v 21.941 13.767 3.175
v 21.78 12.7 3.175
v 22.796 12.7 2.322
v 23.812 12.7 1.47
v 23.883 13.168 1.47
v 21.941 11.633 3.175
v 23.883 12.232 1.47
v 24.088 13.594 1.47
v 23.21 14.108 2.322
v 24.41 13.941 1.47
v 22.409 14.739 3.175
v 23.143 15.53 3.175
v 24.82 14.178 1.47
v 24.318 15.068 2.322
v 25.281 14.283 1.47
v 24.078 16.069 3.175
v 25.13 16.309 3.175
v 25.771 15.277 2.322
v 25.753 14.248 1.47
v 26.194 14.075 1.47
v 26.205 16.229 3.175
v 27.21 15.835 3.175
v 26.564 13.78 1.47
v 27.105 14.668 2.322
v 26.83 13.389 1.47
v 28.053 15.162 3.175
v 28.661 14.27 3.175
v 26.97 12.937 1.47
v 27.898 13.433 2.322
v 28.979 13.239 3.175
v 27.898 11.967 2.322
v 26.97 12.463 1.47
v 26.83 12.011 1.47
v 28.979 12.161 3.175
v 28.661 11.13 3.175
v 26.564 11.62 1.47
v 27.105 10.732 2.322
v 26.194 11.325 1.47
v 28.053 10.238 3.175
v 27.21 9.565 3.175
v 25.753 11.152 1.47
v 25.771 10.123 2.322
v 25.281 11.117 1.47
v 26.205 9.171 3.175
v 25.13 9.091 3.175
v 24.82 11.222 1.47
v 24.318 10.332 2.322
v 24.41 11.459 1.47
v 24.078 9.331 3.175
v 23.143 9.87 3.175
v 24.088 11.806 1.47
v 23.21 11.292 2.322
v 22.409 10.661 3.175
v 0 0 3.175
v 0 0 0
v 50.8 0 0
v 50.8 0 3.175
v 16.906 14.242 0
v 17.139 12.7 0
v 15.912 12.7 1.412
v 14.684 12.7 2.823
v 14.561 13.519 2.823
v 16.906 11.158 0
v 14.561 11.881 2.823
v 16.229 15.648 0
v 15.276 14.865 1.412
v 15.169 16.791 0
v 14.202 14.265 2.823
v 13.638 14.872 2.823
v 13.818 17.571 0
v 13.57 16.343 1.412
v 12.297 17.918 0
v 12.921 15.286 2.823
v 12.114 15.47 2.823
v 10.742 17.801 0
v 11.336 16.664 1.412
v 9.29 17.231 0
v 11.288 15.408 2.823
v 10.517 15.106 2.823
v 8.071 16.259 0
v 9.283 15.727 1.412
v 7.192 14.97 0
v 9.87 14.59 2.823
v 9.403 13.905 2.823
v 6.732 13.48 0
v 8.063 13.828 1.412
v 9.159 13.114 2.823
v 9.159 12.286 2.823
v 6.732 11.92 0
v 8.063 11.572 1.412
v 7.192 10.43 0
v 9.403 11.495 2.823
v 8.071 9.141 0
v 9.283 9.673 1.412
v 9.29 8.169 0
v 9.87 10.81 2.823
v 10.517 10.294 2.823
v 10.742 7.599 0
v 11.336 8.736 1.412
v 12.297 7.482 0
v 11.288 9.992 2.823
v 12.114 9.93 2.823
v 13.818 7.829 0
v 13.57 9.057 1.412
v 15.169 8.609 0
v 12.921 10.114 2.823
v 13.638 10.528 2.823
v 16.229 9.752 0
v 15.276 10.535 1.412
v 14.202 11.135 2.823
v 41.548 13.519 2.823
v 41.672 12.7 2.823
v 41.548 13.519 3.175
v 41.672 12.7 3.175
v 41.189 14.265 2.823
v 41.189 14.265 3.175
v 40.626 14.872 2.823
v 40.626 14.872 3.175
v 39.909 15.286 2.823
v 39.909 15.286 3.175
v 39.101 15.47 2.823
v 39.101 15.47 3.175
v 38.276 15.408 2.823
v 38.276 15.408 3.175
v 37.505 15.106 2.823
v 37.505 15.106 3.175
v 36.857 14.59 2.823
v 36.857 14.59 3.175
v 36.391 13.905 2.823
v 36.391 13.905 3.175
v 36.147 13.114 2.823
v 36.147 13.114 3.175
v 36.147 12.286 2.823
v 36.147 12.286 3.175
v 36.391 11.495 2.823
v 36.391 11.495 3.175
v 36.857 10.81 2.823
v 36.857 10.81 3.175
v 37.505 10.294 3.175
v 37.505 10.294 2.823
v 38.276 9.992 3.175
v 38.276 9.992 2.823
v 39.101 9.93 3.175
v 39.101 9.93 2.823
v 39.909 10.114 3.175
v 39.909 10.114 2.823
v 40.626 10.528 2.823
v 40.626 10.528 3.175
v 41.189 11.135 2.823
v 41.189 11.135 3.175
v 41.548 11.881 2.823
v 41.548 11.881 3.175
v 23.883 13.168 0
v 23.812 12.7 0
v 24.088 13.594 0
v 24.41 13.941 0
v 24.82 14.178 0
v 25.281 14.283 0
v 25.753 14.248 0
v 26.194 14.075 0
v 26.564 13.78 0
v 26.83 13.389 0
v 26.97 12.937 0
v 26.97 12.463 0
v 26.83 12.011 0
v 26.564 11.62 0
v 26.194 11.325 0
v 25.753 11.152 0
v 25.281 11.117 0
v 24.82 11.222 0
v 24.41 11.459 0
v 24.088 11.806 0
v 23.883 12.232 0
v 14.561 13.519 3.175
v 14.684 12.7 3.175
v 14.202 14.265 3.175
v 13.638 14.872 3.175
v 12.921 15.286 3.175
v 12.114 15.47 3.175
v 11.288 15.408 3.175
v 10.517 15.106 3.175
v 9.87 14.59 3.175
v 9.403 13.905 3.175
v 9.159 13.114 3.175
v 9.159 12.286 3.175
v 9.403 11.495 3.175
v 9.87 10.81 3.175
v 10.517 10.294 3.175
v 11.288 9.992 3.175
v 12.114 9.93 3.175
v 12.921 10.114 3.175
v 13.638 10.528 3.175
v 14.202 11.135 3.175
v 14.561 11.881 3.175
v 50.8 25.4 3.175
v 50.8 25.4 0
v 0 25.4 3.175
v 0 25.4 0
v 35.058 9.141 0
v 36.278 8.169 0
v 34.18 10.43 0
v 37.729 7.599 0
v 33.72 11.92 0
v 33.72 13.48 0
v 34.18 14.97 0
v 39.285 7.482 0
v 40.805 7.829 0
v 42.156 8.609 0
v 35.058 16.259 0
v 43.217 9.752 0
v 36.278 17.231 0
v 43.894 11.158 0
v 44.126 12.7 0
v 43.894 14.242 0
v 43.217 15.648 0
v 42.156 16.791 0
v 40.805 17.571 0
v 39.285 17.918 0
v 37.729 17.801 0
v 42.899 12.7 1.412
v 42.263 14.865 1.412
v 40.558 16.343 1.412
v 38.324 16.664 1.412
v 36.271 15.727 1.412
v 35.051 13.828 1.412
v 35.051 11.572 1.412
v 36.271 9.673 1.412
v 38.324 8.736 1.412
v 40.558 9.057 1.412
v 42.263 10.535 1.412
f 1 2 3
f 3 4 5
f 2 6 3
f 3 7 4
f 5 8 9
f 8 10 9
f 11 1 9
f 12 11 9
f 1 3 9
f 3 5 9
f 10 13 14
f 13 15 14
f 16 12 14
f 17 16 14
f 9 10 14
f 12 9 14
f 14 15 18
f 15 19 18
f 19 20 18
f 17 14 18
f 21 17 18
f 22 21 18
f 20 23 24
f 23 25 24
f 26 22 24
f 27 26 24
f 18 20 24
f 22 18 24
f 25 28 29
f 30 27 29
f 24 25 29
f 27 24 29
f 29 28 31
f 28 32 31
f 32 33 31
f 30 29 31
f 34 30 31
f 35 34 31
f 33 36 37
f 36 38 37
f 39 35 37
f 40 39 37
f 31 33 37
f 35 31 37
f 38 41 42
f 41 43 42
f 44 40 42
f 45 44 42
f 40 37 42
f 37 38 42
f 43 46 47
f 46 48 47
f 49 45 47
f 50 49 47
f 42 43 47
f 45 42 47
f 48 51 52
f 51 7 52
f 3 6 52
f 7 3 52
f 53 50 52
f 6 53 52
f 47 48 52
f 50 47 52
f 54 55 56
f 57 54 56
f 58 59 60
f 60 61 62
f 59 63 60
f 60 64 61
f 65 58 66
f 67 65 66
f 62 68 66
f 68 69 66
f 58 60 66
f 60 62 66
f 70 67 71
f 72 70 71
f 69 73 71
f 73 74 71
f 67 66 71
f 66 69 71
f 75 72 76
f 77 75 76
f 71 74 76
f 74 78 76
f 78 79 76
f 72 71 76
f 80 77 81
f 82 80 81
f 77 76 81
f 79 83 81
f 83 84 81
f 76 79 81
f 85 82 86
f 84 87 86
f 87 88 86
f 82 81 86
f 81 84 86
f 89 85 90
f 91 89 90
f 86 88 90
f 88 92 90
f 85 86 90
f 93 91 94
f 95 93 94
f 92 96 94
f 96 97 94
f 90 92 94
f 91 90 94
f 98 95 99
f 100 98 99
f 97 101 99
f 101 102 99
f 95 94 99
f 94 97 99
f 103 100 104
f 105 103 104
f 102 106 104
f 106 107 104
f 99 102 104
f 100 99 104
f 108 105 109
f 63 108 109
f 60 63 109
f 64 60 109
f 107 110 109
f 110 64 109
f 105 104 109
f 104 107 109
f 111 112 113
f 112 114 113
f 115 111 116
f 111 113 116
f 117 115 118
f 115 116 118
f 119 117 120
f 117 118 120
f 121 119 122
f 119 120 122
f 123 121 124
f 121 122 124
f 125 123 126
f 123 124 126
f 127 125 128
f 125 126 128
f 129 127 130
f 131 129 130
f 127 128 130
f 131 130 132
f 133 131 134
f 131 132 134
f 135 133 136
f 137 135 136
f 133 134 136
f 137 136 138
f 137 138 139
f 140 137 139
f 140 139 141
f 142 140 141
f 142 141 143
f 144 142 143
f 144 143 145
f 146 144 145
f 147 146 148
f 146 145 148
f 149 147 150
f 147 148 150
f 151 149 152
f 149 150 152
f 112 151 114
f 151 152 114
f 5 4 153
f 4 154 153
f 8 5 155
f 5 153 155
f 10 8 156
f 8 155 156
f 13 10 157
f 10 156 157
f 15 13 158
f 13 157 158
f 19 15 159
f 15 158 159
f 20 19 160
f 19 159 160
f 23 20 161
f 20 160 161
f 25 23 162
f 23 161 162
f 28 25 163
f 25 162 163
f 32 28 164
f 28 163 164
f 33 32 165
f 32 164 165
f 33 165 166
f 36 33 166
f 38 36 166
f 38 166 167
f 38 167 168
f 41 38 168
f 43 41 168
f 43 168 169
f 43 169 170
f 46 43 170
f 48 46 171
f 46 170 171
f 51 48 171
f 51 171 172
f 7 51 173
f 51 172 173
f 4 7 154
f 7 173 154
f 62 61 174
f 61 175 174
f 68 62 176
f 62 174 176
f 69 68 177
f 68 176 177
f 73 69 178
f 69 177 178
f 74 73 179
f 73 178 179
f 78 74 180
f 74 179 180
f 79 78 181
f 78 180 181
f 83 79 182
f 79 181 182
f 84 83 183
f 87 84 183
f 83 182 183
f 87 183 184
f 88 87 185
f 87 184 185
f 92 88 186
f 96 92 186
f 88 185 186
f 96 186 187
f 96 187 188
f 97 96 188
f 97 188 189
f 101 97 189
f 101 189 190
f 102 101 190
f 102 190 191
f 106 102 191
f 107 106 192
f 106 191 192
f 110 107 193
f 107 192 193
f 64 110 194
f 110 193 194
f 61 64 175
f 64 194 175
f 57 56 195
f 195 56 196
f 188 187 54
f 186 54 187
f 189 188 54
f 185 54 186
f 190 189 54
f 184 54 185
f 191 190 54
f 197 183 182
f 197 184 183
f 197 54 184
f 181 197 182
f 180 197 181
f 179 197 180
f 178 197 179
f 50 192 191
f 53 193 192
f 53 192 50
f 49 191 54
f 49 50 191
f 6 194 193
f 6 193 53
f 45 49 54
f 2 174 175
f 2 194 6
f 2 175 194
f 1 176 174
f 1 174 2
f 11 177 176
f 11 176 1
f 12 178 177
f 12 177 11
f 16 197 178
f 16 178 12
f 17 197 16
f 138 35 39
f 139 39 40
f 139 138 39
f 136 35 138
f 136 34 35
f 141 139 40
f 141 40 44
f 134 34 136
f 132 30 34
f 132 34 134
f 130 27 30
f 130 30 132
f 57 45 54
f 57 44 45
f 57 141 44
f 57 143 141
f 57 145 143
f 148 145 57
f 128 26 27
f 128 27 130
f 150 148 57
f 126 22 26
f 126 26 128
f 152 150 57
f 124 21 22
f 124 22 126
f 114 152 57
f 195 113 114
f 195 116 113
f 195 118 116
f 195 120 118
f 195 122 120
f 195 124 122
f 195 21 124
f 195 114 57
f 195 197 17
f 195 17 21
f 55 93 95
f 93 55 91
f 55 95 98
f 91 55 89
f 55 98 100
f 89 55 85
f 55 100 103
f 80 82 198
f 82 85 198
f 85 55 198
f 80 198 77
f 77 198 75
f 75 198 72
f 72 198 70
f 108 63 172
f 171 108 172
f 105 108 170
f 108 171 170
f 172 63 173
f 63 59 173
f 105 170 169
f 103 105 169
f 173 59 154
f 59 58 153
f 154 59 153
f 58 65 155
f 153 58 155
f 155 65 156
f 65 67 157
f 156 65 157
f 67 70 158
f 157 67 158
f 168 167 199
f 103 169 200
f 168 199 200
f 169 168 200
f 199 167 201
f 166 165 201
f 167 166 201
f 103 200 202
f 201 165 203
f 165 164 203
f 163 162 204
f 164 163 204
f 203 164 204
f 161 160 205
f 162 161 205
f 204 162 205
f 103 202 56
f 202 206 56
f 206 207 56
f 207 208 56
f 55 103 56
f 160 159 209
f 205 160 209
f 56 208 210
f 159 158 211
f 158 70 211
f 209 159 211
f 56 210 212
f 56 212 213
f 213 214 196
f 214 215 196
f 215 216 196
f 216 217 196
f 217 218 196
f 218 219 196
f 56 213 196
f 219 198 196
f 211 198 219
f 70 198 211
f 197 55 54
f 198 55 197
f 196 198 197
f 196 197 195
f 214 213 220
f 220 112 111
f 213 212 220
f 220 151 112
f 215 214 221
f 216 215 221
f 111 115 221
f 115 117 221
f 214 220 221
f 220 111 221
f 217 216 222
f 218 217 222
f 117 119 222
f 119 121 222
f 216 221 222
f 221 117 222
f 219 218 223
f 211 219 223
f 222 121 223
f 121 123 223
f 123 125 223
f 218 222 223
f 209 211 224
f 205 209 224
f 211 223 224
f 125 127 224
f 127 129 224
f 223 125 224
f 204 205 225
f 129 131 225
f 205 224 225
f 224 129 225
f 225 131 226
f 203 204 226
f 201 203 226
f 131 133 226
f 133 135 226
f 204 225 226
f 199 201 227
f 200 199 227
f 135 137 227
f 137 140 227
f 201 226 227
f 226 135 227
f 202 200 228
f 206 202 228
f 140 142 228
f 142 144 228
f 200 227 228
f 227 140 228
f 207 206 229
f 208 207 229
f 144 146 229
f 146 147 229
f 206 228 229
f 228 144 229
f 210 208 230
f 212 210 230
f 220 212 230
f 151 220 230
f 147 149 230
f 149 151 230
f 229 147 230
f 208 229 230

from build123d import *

# Parameters (mm, degrees)
SKETCH1_W                                         = 50.8
SKETCH1_H                                         = 25.4
BOSS_EXTRUDE1_DEPTH                               = 3.175
CSK_FOR_6_FLAT_HEAD_MACHINE_SCREW_100_D           = 3.175
CSK_FOR_6_FLAT_HEAD_MACHINE_SCREW_100_DEPTH       = 25.4
CSK_FOR_6_FLAT_HEAD_MACHINE_SCREW_100_CSINK_D     = 7.239
CSK_FOR_6_FLAT_HEAD_MACHINE_SCREW_100_CSINK_ANGLE = 100
CSK_FOR_6_FLAT_HEAD_MACHINE_SCREW_100_TIP         = 0.953866233


# Read off the part's stored shape, not the designer's step: CSK for #6 Flat Head Machine Screw (100)2
with BuildPart() as part:
    # Sketch1 → Boss-Extrude1 (new body)
    with BuildSketch(Plane.XY):
        with Locations((25.4, 12.7)):
            Rectangle(SKETCH1_W, SKETCH1_H)
    extrude(amount=BOSS_EXTRUDE1_DEPTH)

    # CSK for _6 Flat Head Machine Screw _100
    with Locations(Plane.XY.offset(3.175)):
        with Locations((25.4, 12.7)):
            CounterSinkHole(CSK_FOR_6_FLAT_HEAD_MACHINE_SCREW_100_D / 2, CSK_FOR_6_FLAT_HEAD_MACHINE_SCREW_100_CSINK_D / 2, depth=CSK_FOR_6_FLAT_HEAD_MACHINE_SCREW_100_DEPTH, counter_sink_angle=CSK_FOR_6_FLAT_HEAD_MACHINE_SCREW_100_CSINK_ANGLE)
            with Locations((0, 0, -(CSK_FOR_6_FLAT_HEAD_MACHINE_SCREW_100_DEPTH + CSK_FOR_6_FLAT_HEAD_MACHINE_SCREW_100_TIP / 2))):  # 118° drill point
                Cone(0, CSK_FOR_6_FLAT_HEAD_MACHINE_SCREW_100_D / 2, CSK_FOR_6_FLAT_HEAD_MACHINE_SCREW_100_TIP, mode=Mode.SUBTRACT)

    # CSK for _6 Flat Head Machine Screw _ 2 o → CSK for _6 Flat Head Machine Screw _ 2 (revolve, cut)
    with BuildSketch(Plane(origin=(11.90625, 12.7, 0), x_dir=(1, 0, 0), z_dir=(0, -1, 0))):
        Polygon((2.778125, 2.823320423), (2.778125, 3.175), (0, 3.175), (0, 0), (5.2324, 0), align=None)
    revolve(axis=Axis((11.90625, 12.7, 0), (0, 0, 1)), mode=Mode.SUBTRACT)

    # CSK for _6 Flat Head Machine Screw _ 3 → CSK for _6 Flat Head Machine Screw _ 2 2 (revolve, cut)
    with BuildSketch(Plane(origin=(38.89375, 12.7, 0), x_dir=(1, 0, 0), z_dir=(0, -1, 0))):
        Polygon((2.778125, 2.823320423), (2.778125, 3.175), (0, 3.175), (0, 0), (5.2324, 0), align=None)
    revolve(axis=Axis((38.89375, 12.7, 0), (0, 0, 1)), mode=Mode.SUBTRACT)


solid = part.part
